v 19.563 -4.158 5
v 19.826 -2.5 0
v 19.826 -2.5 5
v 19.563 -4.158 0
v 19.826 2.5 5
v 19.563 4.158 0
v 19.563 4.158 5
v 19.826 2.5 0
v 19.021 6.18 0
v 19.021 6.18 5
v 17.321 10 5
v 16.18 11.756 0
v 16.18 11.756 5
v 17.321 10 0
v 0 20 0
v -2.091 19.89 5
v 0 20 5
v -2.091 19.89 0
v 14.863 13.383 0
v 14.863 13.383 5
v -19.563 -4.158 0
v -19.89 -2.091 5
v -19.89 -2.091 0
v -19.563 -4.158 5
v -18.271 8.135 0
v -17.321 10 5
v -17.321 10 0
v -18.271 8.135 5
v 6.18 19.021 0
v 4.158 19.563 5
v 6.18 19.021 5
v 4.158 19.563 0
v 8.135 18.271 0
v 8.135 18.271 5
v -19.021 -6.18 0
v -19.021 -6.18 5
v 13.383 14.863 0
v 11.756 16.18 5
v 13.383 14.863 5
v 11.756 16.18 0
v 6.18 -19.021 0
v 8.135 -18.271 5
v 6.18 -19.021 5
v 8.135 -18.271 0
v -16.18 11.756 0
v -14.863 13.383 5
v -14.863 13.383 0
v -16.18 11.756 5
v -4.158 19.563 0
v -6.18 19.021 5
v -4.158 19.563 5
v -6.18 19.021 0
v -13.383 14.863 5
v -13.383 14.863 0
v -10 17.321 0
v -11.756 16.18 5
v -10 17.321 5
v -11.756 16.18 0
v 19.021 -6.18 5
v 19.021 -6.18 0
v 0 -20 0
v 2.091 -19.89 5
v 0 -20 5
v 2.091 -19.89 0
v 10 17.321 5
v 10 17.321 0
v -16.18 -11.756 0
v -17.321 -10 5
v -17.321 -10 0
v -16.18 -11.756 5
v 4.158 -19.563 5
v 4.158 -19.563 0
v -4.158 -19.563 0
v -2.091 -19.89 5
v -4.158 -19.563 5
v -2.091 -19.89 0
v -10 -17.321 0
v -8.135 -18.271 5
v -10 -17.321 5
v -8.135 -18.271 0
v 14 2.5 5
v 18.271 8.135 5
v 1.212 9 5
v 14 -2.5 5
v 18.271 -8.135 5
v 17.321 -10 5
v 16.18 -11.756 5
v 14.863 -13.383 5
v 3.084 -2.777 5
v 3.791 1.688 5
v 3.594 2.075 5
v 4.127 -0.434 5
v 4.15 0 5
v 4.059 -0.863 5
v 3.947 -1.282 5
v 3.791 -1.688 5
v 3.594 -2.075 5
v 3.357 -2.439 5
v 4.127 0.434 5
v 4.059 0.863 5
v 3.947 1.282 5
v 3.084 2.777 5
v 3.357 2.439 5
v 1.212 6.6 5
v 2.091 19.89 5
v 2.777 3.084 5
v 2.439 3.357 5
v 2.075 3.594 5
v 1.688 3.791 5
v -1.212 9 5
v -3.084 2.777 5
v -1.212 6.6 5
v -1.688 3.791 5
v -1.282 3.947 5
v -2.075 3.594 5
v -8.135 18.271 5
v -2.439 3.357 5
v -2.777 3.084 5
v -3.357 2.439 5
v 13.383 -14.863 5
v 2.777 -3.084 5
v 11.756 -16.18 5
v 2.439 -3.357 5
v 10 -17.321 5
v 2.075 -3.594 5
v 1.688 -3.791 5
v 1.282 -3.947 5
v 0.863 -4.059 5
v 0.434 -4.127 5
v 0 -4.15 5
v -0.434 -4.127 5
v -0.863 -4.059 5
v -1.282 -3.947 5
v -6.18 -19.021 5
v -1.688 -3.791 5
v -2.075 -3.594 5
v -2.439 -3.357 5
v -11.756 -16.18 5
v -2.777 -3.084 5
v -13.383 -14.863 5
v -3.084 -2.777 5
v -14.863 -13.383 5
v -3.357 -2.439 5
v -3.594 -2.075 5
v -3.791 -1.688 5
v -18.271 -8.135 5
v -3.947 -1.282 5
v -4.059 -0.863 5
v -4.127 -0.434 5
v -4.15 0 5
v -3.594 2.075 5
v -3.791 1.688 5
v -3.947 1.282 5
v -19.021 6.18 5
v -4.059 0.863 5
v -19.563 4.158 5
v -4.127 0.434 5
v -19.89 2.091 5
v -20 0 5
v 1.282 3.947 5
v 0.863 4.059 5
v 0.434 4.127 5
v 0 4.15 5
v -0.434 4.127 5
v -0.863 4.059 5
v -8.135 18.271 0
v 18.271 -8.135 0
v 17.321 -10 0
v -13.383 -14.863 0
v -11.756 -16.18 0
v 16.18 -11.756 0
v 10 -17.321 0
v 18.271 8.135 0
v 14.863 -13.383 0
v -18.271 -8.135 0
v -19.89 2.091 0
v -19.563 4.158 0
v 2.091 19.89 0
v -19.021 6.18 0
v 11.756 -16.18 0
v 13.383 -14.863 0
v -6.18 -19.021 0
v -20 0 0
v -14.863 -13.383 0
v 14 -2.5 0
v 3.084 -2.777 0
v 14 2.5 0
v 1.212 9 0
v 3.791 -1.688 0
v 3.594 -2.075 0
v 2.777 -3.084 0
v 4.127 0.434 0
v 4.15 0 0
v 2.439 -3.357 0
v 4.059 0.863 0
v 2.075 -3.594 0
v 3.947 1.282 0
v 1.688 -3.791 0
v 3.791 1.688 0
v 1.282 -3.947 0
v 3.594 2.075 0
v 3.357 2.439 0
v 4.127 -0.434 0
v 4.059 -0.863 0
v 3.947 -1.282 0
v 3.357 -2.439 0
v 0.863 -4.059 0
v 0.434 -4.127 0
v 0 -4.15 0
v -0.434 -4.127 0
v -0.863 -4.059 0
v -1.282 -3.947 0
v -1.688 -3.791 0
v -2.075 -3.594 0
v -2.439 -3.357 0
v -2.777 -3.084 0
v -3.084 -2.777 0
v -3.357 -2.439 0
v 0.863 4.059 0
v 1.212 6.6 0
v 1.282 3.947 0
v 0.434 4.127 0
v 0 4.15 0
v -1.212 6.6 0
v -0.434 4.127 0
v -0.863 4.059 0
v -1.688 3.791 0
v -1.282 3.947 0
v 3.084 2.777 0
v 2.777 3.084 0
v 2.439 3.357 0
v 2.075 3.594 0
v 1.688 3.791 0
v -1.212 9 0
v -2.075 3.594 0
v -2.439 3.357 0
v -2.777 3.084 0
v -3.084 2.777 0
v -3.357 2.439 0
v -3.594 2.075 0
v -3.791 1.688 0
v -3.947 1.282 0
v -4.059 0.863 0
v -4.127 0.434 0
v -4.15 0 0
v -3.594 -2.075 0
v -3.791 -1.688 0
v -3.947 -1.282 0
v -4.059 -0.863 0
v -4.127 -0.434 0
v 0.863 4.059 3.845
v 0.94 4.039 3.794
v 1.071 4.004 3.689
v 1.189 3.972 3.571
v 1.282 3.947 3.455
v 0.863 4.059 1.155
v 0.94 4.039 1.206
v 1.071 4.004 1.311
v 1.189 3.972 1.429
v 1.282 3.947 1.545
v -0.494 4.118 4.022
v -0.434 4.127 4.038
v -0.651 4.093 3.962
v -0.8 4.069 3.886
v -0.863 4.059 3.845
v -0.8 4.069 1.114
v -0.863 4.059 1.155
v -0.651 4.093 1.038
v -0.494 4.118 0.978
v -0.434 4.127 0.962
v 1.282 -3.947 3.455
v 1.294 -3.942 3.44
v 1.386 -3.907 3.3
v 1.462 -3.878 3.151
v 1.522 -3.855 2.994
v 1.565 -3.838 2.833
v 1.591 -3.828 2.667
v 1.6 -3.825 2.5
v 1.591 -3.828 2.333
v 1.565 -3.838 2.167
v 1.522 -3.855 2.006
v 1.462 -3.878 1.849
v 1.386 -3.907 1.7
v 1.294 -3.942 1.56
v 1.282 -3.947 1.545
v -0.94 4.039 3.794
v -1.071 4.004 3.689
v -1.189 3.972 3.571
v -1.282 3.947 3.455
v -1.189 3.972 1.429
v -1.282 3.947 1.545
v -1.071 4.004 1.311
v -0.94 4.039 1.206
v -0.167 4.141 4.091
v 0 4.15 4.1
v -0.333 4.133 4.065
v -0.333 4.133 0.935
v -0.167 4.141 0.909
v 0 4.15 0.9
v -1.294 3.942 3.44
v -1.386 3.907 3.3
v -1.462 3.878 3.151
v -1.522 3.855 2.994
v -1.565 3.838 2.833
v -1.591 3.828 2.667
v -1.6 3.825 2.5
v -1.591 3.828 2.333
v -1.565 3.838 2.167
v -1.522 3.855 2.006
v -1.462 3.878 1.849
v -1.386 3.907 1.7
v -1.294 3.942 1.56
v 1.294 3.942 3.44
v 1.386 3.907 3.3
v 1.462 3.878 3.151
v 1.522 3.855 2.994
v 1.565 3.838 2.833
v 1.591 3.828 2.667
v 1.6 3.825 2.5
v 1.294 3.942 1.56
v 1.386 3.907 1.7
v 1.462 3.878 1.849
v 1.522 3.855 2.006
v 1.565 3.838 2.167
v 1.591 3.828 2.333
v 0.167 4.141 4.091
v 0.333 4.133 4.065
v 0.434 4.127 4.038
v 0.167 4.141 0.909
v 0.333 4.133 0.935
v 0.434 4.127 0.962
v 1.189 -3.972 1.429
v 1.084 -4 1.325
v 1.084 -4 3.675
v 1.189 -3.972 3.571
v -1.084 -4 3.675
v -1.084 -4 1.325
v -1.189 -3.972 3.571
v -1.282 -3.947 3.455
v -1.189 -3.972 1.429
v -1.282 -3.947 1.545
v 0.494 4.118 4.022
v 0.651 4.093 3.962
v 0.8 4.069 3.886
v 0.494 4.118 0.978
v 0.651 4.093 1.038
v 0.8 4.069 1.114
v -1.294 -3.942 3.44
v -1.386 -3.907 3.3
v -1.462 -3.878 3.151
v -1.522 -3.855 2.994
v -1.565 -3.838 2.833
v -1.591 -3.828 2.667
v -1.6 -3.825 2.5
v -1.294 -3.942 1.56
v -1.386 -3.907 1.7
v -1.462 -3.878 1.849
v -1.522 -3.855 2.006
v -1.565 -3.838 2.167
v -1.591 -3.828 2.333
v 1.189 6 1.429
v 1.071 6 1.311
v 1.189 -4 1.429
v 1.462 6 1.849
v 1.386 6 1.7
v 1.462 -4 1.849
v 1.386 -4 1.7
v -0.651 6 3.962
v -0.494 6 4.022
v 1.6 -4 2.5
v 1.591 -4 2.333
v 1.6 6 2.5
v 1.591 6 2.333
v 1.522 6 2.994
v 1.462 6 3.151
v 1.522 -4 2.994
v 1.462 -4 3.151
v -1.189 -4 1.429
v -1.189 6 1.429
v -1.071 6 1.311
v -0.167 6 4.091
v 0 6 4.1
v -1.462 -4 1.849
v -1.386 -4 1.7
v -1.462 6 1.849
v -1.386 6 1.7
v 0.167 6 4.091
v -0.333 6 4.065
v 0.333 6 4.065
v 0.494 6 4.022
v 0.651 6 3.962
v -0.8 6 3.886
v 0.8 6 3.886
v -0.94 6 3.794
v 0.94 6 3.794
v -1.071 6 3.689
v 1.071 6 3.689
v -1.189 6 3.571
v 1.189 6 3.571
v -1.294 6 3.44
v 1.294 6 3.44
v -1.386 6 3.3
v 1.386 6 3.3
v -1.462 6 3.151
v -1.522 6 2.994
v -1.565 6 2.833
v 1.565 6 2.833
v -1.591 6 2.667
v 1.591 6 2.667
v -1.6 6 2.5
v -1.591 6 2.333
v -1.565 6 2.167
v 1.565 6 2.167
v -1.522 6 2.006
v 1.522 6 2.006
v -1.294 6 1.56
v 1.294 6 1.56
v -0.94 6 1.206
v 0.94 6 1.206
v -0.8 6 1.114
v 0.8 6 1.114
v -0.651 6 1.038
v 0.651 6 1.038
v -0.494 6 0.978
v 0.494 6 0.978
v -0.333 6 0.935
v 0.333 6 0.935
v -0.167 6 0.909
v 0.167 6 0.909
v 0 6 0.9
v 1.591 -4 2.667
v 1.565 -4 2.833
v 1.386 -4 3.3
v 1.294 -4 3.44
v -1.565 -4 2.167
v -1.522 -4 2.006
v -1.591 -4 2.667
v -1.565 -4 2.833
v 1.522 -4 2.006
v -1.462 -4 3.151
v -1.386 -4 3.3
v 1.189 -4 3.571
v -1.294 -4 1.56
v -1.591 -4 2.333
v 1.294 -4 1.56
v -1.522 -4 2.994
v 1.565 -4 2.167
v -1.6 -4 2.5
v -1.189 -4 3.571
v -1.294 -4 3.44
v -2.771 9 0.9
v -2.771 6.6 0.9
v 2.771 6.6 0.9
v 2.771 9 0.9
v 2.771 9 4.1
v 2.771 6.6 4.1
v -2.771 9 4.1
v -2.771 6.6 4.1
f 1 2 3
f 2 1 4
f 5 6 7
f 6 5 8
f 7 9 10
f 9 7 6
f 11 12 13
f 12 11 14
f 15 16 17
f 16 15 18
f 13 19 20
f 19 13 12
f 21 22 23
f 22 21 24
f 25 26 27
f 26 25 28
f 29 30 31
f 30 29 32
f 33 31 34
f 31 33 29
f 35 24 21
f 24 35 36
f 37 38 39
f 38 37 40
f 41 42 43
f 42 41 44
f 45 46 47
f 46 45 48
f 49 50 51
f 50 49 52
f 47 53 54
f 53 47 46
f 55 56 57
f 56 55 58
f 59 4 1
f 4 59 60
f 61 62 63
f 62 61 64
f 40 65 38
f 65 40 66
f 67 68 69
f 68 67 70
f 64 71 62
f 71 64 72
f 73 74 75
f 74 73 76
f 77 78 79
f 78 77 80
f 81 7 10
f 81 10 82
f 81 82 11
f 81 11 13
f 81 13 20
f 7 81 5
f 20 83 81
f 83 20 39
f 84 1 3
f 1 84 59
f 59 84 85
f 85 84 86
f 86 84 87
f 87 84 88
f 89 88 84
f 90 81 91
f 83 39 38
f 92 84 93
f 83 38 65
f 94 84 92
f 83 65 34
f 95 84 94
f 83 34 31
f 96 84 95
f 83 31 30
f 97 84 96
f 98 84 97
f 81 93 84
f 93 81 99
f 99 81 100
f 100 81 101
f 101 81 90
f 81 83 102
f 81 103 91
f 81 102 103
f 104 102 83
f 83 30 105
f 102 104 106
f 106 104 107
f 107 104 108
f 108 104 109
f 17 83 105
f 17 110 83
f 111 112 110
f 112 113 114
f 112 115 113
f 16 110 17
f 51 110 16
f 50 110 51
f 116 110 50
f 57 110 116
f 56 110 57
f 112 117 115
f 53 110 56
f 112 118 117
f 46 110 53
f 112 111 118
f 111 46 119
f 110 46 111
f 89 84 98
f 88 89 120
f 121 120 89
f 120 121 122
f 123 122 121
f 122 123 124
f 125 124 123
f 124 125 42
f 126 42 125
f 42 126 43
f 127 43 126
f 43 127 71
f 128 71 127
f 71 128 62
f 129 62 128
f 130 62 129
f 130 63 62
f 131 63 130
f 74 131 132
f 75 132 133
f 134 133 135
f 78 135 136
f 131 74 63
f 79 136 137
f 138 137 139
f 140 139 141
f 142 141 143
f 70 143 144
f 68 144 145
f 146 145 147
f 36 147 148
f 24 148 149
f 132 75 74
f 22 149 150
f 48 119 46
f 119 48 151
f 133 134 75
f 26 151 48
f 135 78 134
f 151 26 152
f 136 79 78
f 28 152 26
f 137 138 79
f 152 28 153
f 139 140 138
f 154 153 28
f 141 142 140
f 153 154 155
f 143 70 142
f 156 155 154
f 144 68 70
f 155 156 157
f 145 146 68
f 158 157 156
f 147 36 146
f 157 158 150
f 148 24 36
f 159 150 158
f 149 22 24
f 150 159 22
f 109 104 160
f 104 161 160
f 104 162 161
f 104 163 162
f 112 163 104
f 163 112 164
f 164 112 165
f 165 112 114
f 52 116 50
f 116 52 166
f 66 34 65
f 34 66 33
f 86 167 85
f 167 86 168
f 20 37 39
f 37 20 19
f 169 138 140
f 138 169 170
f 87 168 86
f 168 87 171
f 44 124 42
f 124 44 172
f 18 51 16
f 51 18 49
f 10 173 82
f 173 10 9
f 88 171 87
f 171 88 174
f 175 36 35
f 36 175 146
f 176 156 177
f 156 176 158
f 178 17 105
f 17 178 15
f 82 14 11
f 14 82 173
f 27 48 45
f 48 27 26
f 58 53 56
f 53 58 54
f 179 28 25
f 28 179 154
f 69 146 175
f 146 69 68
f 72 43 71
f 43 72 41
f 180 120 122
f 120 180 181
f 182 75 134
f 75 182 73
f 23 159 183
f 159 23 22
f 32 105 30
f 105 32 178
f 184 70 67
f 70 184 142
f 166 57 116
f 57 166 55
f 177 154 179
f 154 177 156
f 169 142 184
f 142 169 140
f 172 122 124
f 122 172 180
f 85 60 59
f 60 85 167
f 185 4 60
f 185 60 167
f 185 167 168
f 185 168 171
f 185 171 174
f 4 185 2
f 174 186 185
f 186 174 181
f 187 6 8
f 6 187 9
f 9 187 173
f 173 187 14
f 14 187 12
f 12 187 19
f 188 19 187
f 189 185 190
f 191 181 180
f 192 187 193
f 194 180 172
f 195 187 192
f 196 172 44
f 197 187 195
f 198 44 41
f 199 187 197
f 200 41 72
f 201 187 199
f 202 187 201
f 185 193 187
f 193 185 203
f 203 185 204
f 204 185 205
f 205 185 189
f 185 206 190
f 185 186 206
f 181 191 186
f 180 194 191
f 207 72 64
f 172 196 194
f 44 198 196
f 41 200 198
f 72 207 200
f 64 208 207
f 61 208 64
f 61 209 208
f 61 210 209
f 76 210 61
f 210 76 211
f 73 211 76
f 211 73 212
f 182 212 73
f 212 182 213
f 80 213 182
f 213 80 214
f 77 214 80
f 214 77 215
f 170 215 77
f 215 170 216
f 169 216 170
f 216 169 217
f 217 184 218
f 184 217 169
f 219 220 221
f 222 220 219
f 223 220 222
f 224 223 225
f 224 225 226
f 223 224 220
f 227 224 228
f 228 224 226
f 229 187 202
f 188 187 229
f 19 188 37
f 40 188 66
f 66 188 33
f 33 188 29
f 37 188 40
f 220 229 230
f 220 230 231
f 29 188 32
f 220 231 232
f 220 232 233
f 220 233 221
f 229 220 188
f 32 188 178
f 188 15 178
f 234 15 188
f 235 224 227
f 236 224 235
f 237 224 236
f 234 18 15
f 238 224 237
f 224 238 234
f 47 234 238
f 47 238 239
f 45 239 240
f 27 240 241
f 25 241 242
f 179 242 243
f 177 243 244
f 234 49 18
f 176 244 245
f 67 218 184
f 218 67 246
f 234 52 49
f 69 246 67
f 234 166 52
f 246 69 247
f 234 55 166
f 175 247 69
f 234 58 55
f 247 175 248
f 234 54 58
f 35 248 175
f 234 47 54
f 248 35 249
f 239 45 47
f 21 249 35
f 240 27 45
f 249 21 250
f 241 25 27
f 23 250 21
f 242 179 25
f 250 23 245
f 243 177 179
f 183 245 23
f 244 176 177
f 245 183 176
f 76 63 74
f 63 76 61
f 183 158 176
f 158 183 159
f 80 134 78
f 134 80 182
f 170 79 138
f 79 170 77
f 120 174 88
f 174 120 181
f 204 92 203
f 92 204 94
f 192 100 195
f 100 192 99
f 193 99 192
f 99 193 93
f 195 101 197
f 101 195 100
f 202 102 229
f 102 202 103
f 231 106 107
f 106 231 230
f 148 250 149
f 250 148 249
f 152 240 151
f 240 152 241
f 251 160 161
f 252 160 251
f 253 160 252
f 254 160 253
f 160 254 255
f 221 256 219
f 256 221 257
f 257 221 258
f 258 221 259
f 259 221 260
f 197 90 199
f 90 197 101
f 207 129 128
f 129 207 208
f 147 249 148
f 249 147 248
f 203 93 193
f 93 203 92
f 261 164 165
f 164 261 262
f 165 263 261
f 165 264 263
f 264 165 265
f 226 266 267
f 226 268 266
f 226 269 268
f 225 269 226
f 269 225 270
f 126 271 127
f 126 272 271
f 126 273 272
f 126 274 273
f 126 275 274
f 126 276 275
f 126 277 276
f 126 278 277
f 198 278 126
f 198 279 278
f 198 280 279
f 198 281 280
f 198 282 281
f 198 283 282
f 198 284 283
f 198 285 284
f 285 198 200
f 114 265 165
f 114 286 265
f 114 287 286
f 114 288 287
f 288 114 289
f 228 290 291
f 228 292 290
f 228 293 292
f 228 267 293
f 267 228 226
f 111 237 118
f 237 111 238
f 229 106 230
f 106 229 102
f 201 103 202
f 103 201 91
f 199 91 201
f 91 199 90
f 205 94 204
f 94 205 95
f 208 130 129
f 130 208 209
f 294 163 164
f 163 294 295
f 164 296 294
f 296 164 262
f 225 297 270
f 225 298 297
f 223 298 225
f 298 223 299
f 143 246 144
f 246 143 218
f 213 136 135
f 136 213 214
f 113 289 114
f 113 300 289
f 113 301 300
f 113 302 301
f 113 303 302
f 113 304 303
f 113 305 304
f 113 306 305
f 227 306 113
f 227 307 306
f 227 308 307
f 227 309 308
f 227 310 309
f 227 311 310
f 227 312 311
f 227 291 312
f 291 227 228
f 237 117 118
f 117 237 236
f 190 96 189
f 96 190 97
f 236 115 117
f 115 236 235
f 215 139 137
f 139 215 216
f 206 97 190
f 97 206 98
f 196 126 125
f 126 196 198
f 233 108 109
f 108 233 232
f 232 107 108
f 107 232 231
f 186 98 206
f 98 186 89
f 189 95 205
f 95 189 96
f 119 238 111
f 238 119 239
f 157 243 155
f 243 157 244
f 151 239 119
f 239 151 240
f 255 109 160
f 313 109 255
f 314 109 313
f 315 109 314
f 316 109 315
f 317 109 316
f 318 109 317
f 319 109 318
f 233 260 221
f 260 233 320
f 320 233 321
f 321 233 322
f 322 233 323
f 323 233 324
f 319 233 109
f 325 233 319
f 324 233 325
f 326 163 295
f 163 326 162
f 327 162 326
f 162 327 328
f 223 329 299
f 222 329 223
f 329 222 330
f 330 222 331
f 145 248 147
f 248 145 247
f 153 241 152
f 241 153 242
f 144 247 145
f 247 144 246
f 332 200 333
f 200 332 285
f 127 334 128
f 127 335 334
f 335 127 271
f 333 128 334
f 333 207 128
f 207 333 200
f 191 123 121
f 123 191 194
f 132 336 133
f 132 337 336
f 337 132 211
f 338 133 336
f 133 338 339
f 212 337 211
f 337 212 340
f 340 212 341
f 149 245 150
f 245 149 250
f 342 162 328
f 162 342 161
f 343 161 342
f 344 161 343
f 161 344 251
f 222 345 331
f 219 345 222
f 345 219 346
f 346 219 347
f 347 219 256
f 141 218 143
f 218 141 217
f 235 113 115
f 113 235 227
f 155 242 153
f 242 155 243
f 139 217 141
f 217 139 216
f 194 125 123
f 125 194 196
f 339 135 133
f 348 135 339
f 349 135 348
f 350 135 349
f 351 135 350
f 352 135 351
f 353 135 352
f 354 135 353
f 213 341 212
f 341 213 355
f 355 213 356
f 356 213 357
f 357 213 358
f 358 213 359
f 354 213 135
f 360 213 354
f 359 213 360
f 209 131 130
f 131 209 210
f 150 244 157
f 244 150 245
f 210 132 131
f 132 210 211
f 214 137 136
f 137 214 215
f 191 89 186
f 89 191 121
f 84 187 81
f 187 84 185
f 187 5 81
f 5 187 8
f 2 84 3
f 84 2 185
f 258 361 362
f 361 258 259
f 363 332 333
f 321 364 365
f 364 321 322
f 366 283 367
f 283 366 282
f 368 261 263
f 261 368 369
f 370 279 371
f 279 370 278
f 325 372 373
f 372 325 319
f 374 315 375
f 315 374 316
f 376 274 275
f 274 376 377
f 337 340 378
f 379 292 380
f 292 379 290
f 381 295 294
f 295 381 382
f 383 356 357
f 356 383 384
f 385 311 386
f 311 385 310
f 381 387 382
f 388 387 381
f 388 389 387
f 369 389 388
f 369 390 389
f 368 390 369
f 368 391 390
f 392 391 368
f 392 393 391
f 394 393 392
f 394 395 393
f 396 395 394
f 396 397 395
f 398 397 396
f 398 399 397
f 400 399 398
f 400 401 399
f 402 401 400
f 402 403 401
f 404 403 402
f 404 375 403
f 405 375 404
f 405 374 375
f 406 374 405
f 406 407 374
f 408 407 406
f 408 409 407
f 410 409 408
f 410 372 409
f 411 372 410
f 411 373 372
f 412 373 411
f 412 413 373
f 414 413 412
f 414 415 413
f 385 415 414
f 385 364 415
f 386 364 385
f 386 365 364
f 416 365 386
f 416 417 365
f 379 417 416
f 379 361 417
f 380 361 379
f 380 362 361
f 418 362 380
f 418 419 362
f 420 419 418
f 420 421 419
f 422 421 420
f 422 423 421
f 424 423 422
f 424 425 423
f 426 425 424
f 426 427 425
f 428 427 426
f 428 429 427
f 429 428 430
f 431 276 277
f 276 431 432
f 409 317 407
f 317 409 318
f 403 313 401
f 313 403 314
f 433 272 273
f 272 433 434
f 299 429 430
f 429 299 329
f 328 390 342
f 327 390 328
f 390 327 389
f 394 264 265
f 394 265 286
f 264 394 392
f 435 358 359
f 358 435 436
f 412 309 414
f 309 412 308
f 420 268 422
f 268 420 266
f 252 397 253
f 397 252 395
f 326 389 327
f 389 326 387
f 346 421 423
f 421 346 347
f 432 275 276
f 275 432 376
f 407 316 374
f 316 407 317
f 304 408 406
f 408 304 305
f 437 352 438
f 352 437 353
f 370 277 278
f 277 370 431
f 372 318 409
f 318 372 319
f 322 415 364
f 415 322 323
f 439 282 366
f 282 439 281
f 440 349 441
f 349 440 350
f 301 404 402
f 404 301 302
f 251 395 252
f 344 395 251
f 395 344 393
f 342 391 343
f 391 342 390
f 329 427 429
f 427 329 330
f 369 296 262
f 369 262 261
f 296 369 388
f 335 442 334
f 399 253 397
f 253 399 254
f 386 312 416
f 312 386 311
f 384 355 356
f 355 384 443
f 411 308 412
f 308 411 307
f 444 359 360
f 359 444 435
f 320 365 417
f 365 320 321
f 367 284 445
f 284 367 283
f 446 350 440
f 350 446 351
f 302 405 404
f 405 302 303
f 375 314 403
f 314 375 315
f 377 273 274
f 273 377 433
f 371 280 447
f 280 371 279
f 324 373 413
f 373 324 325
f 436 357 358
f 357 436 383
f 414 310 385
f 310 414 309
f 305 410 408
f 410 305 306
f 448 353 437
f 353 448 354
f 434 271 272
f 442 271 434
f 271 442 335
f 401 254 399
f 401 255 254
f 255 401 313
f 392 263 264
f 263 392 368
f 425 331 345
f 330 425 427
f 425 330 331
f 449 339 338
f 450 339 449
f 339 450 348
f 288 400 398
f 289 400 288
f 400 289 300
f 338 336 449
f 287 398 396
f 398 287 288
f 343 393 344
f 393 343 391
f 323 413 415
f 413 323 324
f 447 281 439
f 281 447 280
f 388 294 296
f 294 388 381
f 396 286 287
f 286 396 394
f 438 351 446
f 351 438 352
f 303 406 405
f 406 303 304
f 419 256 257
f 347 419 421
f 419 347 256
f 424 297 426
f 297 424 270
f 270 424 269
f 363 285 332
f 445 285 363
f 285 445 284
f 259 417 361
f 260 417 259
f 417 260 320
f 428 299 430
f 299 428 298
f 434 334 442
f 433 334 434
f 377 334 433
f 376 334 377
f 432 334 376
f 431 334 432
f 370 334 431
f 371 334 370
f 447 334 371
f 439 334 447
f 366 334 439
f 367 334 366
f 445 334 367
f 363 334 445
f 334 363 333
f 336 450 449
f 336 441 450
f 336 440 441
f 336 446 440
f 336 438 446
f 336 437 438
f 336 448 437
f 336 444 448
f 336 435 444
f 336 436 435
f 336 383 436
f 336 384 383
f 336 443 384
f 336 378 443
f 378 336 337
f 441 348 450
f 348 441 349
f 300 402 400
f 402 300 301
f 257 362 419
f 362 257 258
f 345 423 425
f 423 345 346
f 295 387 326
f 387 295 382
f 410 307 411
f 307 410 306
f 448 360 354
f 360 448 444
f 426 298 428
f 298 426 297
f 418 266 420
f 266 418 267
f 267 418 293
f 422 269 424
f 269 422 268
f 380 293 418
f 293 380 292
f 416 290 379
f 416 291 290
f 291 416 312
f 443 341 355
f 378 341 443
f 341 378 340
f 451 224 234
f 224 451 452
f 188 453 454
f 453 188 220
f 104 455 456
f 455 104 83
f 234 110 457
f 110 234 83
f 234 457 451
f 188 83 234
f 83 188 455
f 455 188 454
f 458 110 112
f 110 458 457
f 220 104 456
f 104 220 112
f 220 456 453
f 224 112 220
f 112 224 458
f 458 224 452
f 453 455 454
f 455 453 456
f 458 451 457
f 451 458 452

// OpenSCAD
// file: parameters.scad
// =============================================================================
// Coil Winder - Common Parameters
// DTU 34621 Metal Detector Project
// =============================================================================

// -----------------------------------------------------------------------------
// Hardware Dimensions
// -----------------------------------------------------------------------------

// M8 Threaded Rod (Spindle)
spindle_dia = 8;
spindle_length = 300;

// 608ZZ Bearing (Skateboard bearing)
bearing_od = 22;
bearing_id = 8;
bearing_width = 7;

// M3 Hardware
m3_bolt_dia = 3.2;
m3_nut_dia = 6.4;
m3_nut_height = 2.4;
m3_head_dia = 5.5;
m3_head_height = 3;

// M8 Hardware
m8_nut_dia = 14.6;
m8_nut_height = 6.5;

// -----------------------------------------------------------------------------
// Servo Dimensions (SG90 / MG90S style)
// -----------------------------------------------------------------------------

servo_body_w = 23;
servo_body_h = 22.5;
servo_body_d = 12.5;
servo_tab_w = 32.5;
servo_tab_h = 2.5;
servo_tab_offset = 15.5;  // from bottom
servo_mount_hole_spacing = 28;
servo_shaft_offset = 5.5;  // from center of body
servo_horn_length = 15;

// -----------------------------------------------------------------------------
// ITR8307 Optical Sensor
// -----------------------------------------------------------------------------

itr8307_width = 10.8;
itr8307_depth = 5.2;
itr8307_height = 6.3;
itr8307_slot_width = 3;
itr8307_slot_depth = 4;

// -----------------------------------------------------------------------------
// Coil Dimensions
// -----------------------------------------------------------------------------

// TX Coil - 200mm diameter
tx_coil_dia = 200;
tx_coil_width = 18;
tx_coil_turns = 68;

// RX Coil - 80mm diameter
rx_coil_dia = 80;
rx_coil_width = 14;
rx_coil_turns = 170;

// Bucking Coil - 120mm diameter
buck_coil_dia = 120;
buck_coil_width = 18;
buck_coil_turns = 35;

// -----------------------------------------------------------------------------
// Frame Dimensions
// -----------------------------------------------------------------------------

base_length = 250;
base_width = 120;
base_thickness = 5;

bearing_mount_height = 40;
bearing_mount_width = 35;
bearing_mount_depth = 25;

// Distance between bearing centers
spindle_span = 200;

// -----------------------------------------------------------------------------
// Wire Guide / Traverse
// -----------------------------------------------------------------------------

guide_rail_length = 80;
guide_rail_width = 10;
guide_rail_height = 5;

carriage_width = 25;
carriage_depth = 20;
carriage_height = 15;

// -----------------------------------------------------------------------------
// Encoder Wheel
// -----------------------------------------------------------------------------

encoder_wheel_dia = 40;
encoder_wheel_thickness = 5;
encoder_slot_width = 5;
encoder_slot_depth = 12;

// -----------------------------------------------------------------------------
// General Tolerances
// -----------------------------------------------------------------------------

clearance = 0.3;        // General clearance for fitting parts
press_fit = 0.1;        // Tight fit
slide_fit = 0.4;        // Sliding fit

// -----------------------------------------------------------------------------
// Print Settings
// -----------------------------------------------------------------------------

wall_thickness = 2.4;   // 3 perimeters at 0.4mm nozzle
layer_height = 0.2;

$fn = 60;  // Circle resolution
// main file
// =============================================================================
// Encoder Wheel - Single slot for ITR8307 turn counting
// =============================================================================

include <parameters.scad>

module encoder_wheel() {
    difference() {
        // Main disc
        cylinder(d=encoder_wheel_dia, h=encoder_wheel_thickness);

        // Center hole for M8 spindle (tight fit with set screw)
        translate([0, 0, -0.1])
            cylinder(d=spindle_dia + clearance, h=encoder_wheel_thickness + 0.2);

        // Slot that blocks the IR beam
        translate([encoder_wheel_dia/2 - encoder_slot_depth/2, -encoder_slot_width/2, -0.1])
            cube([encoder_slot_depth + 1, encoder_slot_width, encoder_wheel_thickness + 0.2]);

        // Set screw hole (M3) - to lock onto spindle
        translate([0, spindle_dia/2 + 2, encoder_wheel_thickness/2])
            rotate([90, 0, 0])
                cylinder(d=m3_bolt_dia, h=10);

        // Nut trap for set screw
        translate([0, spindle_dia/2 + 5, encoder_wheel_thickness/2])
            rotate([90, 30, 0])
                cylinder(d=m3_nut_dia, h=m3_nut_height, $fn=6);
    }
}

// Render for export
encoder_wheel();
